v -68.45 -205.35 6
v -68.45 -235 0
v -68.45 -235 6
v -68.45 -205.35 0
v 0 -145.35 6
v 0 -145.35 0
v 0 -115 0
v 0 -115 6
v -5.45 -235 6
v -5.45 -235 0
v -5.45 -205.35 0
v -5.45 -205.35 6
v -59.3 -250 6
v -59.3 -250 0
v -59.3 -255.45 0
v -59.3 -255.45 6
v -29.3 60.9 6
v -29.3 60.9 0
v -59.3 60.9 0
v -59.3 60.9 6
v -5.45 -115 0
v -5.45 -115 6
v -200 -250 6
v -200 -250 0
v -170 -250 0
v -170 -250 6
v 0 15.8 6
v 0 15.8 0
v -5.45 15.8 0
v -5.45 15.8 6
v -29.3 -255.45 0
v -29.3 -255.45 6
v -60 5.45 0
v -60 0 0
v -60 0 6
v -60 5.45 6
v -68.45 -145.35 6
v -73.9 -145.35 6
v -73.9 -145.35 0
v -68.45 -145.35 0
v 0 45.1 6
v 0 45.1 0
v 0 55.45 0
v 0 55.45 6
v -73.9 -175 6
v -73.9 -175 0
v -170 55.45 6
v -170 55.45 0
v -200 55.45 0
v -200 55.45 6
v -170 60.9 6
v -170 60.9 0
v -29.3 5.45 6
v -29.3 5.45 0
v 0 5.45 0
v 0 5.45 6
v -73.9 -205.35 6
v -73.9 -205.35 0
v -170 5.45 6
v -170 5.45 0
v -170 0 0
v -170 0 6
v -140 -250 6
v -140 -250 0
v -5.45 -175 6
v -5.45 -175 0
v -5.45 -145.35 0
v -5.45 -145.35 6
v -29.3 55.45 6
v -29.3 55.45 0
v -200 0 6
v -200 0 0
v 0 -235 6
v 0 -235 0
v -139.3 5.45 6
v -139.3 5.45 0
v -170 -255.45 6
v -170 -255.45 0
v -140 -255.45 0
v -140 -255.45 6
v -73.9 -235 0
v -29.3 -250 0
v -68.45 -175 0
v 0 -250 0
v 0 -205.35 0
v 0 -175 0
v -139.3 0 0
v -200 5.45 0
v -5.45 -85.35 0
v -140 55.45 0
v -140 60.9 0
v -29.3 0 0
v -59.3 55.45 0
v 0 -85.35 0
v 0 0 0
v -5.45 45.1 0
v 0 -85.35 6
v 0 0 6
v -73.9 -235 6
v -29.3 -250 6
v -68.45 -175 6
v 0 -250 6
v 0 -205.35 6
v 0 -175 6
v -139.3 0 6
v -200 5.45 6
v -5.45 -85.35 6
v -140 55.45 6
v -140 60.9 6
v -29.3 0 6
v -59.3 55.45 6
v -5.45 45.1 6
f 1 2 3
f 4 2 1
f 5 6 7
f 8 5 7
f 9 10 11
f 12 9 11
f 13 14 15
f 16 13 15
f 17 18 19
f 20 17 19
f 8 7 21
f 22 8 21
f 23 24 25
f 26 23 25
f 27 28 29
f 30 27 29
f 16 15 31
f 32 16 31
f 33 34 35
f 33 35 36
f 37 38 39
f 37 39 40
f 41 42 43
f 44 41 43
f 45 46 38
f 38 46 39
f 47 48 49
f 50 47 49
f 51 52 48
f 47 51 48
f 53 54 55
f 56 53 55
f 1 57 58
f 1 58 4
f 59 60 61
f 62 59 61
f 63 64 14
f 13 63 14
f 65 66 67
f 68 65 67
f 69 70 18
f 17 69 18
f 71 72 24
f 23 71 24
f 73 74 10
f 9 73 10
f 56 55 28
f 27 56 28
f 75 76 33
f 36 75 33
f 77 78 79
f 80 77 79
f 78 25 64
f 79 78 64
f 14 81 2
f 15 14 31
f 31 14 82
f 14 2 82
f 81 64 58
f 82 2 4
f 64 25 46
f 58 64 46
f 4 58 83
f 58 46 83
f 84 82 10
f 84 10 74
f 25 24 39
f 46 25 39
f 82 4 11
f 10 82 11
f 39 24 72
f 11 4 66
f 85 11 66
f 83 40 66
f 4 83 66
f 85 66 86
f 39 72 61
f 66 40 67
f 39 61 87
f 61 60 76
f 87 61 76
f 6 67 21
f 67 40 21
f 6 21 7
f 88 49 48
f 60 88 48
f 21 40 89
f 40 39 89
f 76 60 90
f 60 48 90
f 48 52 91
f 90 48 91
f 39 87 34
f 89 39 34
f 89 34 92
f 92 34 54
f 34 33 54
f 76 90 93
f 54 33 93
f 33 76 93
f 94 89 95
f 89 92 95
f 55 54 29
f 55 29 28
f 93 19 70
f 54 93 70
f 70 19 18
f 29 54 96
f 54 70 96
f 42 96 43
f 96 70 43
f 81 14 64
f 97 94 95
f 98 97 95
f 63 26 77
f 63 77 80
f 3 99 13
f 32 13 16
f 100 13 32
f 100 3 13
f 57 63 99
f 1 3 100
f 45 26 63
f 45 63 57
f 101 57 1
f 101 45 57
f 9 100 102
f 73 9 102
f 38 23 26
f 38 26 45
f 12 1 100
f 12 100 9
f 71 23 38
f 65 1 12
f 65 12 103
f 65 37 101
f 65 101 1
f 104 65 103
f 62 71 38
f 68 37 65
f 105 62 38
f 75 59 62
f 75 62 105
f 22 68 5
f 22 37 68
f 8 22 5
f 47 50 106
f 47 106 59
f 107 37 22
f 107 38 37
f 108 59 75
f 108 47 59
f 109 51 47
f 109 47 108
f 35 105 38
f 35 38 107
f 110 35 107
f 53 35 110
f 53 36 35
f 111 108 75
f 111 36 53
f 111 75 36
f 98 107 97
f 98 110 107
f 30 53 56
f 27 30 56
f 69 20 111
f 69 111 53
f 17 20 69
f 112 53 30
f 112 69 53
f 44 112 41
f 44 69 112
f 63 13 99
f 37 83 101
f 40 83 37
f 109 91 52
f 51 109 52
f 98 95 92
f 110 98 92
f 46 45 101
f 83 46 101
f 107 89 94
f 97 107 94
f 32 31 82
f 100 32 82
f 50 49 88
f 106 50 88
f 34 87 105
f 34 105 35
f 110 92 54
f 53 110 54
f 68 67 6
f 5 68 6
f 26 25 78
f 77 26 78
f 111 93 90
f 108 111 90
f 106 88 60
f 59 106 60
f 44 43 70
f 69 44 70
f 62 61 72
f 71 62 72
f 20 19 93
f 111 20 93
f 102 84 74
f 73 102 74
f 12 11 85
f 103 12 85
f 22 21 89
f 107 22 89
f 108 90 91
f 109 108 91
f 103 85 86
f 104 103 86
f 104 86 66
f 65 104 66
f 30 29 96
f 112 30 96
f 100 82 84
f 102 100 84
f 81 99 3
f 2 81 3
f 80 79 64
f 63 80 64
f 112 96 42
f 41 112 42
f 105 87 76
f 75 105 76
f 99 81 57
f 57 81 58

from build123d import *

# Parameters (mm, degrees)
SKETCH_2_W      = 79.3
SKETCH_2_H      = 5.45
SKETCH_2_W_2    = 5.45
SKETCH_2_H_2    = 29.65
EXTRUDE_1_DEPTH = 6


with BuildPart() as part:
    # Эскиз2 → Бобышка-Вытянуть1 (new body)
    with BuildSketch(Plane.XY):
        Polygon((0, 0), (-29.3, 0), (-29.3, 5.45), (0, 5.45), (0, 15.8), (-5.45, 15.8), (-5.45, 45.1), (0, 45.1), (0, 55.45), (-29.3, 55.45), (-29.3, 60.9), (-59.3, 60.9), (-59.3, 55.45), (-140, 55.45), (-140, 60.9), (-170, 60.9), (-170, 55.45), (-200, 55.45), (-200, 5.45), (-170, 5.45), (-170, 0), (-200, 0), (-200, -250), (-170, -250), (-170, -255.45), (-140, -255.45), (-140, -250), (-59.3, -250), (-59.3, -255.45), (-29.3, -255.45), (-29.3, -250), (0, -250), (0, -235), (-5.45, -235), (-5.45, -205.35), (0, -205.35), (0, -175), (-5.45, -175), (-5.45, -145.35), (0, -145.35), (0, -115), (-5.45, -115), (-5.45, -85.35), (0, -85.35), align=None)
        with Locations((-99.65, 2.725)):
            Rectangle(SKETCH_2_W, SKETCH_2_H, mode=Mode.SUBTRACT)
        with Locations((-71.175, -220.175)):
            Rectangle(SKETCH_2_W_2, SKETCH_2_H_2, mode=Mode.SUBTRACT)
        with Locations((-71.175, -160.175)):
            Rectangle(SKETCH_2_W_2, SKETCH_2_H_2, mode=Mode.SUBTRACT)
    extrude(amount=EXTRUDE_1_DEPTH)


solid = part.part
